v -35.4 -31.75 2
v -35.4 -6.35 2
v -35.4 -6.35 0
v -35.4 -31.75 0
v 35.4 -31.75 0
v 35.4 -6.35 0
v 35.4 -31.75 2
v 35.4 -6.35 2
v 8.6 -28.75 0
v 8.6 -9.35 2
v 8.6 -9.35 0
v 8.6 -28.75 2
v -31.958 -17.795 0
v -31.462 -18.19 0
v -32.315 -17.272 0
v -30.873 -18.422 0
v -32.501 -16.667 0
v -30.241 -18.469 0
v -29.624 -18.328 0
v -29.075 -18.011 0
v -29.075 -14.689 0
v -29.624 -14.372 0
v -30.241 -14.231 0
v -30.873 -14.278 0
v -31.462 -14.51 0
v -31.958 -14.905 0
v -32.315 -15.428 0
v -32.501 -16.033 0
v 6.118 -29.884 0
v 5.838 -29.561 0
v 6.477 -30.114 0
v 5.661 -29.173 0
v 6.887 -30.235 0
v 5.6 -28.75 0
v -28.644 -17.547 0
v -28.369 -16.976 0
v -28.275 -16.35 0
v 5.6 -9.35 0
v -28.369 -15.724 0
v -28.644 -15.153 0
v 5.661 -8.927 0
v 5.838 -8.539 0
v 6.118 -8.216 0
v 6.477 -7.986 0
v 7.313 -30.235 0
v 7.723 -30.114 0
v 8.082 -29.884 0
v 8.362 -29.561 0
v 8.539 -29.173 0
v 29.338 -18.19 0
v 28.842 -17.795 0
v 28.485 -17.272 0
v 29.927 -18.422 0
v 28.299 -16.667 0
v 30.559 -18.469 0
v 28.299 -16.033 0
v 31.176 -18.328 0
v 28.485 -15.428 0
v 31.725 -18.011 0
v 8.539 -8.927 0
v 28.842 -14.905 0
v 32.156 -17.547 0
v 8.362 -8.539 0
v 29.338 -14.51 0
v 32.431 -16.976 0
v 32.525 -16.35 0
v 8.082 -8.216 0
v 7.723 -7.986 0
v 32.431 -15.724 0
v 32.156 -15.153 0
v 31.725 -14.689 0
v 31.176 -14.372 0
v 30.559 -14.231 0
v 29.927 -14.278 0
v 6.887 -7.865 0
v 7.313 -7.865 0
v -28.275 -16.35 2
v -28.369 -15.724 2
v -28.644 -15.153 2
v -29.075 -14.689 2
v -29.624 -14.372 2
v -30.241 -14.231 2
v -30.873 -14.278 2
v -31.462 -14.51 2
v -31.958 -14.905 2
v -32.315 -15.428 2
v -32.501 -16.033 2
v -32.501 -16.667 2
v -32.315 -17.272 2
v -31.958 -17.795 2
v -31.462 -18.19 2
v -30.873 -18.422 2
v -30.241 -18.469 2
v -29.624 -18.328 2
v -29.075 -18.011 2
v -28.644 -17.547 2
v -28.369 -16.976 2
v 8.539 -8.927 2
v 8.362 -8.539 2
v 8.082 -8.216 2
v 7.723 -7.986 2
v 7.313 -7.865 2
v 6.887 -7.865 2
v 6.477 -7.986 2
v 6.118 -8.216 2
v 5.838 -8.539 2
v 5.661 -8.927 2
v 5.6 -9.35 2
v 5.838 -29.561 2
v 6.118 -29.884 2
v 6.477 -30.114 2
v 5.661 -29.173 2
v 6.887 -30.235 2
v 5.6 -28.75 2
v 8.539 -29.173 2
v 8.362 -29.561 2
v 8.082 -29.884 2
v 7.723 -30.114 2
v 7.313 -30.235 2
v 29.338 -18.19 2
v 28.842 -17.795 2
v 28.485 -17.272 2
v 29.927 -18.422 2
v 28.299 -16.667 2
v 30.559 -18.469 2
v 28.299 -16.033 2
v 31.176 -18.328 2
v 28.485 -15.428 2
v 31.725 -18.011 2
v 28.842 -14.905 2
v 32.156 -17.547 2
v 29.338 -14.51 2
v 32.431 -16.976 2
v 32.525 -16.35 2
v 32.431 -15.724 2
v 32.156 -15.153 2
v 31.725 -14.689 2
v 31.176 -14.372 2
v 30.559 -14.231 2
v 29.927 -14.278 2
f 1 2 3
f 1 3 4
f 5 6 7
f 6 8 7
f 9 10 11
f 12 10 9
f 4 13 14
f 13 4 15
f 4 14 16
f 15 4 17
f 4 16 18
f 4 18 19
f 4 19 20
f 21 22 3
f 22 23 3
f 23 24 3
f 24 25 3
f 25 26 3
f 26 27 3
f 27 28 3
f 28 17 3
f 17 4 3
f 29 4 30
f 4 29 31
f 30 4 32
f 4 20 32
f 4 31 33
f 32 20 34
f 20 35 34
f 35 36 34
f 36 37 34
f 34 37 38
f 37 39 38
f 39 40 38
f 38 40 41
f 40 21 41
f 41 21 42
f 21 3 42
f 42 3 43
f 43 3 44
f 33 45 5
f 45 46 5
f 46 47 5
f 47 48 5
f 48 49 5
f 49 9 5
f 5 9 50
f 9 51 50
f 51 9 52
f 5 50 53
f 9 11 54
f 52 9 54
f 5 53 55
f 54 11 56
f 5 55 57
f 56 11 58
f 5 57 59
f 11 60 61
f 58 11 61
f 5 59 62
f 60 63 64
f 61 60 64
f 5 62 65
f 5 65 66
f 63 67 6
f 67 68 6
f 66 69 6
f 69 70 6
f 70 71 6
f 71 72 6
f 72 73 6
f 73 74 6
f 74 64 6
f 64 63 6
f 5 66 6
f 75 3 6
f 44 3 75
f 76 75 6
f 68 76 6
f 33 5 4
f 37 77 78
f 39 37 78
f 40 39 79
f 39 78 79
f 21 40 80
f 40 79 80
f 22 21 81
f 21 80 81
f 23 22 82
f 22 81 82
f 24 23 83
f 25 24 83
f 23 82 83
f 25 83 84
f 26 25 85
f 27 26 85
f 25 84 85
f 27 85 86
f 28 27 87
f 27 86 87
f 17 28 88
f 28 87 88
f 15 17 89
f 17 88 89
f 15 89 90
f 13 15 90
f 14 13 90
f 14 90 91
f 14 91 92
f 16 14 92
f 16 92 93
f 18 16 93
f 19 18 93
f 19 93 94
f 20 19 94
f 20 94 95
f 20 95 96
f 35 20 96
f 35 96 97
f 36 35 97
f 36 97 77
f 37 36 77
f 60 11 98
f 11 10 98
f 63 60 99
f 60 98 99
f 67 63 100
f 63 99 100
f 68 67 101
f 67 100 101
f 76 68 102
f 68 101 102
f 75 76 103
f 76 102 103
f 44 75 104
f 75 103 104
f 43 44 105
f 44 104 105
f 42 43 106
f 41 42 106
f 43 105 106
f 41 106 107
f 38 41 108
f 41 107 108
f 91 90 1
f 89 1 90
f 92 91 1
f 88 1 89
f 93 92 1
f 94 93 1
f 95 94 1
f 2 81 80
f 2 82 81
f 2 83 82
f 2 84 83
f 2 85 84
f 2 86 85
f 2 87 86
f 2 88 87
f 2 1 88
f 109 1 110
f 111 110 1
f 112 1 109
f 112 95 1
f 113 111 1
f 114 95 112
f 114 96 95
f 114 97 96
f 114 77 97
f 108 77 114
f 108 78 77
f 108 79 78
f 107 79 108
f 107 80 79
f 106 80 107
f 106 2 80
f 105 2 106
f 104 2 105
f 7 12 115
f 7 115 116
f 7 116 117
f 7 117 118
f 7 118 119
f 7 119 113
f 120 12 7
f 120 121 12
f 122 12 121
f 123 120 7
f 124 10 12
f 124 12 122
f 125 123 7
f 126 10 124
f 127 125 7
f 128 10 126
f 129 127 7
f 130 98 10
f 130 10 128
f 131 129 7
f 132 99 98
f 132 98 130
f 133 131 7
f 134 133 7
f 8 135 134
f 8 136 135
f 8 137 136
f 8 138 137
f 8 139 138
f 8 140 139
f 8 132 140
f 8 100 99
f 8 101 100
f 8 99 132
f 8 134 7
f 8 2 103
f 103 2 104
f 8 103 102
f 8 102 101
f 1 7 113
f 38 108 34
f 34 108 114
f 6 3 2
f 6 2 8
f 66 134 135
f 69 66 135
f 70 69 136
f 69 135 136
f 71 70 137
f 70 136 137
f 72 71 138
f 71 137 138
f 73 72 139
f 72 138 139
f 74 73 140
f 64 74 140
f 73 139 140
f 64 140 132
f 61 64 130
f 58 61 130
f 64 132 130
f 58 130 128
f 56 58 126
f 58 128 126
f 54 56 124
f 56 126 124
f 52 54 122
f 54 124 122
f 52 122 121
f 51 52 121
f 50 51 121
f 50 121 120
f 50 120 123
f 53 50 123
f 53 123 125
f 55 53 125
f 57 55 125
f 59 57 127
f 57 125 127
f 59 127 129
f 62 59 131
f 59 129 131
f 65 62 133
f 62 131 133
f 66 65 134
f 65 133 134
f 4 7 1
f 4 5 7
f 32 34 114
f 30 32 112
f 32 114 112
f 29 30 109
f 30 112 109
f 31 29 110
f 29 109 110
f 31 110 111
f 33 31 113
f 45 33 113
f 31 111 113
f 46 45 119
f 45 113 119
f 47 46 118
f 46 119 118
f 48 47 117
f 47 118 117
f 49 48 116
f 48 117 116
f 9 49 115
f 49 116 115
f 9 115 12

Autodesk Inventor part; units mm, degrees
ref_plane "YZ Plane" through (0, 0, 0) normal (1, 0, 0) x (0, 1, 0)
ref_plane "XZ Plane" through (0, 0, 0) normal (0, 1, 0) x (-1, 0, 0)
ref_plane "XY Plane" through (0, 0, 0) normal (0, 0, 1) x (1, 0, 0)
sketch "Sketch1" plane through (0, 0, 0) normal (0, 0, 1) x (1, 0, 0)
  line L0 (0, -6.35) -> (25.4, -6.35)
  line L1 (25.4, -6.35) -> (25.4, -31.75)
  line L2 (25.4, -31.75) -> (-25.4, -31.75)
  line L3 (-25.4, -31.75) -> (-25.4, -6.35)
  line L4 (-25.4, -6.35) -> (0, -6.35)
  point P0 (-6.35, -6.35)
  point P1 (6.35, -6.35)
  dimension "d7" = 25.4
  dimension "d8" = 25.4
  dimension "d9" = 50.8
extrude "Extrusion1" add sketch "Sketch1" along normal blind 2
sketch "Sketch2" plane through (0, 0, 2) normal (0, 0, 1) x (1, 0, 0)
  line L0 (-25.4, -6.35) -> (-25.4, -31.75) projected
  line L1 (-25.4, -31.75) -> (7.1, -31.75)
  line L2 (-25.4, -31.75) -> (25.4, -31.75) projected
  line L3 (7.1, -31.75) -> (7.1, -30.75)
  line L4 (7.1, -30.75) -> (7.1, -28.75)
  circle A0 centre (7.1, -28.75) radius 1.5
  circle A1 centre (7.1, -9.35) radius 1.5
  line L5 (5.6, -9.35) -> (5.6, -28.75)
  line L6 (8.6, -9.35) -> (8.6, -28.75)
  point P0 (0, 0)
  dimension "d10" = 32.5
  dimension "d11" = 1
  dimension "d12" = 2
  dimension "d13" = 3
  dimension "d15" = 3
extrude "Extrusion2" cut sketch "Sketch2" against normal blind 2.54
sketch "Sketch4" plane through (0, 0, 2) normal (0, 0, 1) x (1, 0, 0)
  line L0 (25.4, -6.35) -> (35.4, -6.35)
  line L1 (35.4, -6.35) -> (35.4, -16.35)
  circle A0 centre (30.4, -16.35) radius 2.125
  line L2 (25.4, -6.35) -> (35.4, -6.35)
  line L3 (35.4, -6.35) -> (35.4, -31.75)
  line L4 (35.4, -31.75) -> (25.4, -31.75)
  line L5 (25.4, -31.75) -> (25.4, -6.35)
  line L6 (25.4, -6.35) -> (-25.4, -6.35) projected
  line L7 (25.4, -6.35) -> (0, -6.35)
  line L8 (0, -6.35) -> (0, -31.75)
  line L9 (-25.4, -6.35) -> (-35.4, -6.35)
  line L10 (-35.4, -6.35) -> (-35.4, -16.35)
  circle A1 centre (-30.4, -16.35) radius 2.125
  line L11 (-25.4, -6.35) -> (-35.4, -6.35)
  line L12 (-35.4, -6.35) -> (-35.4, -31.75)
  line L13 (-35.4, -31.75) -> (-25.4, -31.75)
  line L14 (-25.4, -31.75) -> (-25.4, -6.35)
  point P0 (0, 0)
  dimension "d40" = 10
  dimension "d41" = 10
  dimension "d42" = 4.25
  dimension "d43" = 25.4
extrude "Extrusion4" add sketch "Sketch4" against normal blind 2
properties part number "Ultrasonic Sensor 2.0"
